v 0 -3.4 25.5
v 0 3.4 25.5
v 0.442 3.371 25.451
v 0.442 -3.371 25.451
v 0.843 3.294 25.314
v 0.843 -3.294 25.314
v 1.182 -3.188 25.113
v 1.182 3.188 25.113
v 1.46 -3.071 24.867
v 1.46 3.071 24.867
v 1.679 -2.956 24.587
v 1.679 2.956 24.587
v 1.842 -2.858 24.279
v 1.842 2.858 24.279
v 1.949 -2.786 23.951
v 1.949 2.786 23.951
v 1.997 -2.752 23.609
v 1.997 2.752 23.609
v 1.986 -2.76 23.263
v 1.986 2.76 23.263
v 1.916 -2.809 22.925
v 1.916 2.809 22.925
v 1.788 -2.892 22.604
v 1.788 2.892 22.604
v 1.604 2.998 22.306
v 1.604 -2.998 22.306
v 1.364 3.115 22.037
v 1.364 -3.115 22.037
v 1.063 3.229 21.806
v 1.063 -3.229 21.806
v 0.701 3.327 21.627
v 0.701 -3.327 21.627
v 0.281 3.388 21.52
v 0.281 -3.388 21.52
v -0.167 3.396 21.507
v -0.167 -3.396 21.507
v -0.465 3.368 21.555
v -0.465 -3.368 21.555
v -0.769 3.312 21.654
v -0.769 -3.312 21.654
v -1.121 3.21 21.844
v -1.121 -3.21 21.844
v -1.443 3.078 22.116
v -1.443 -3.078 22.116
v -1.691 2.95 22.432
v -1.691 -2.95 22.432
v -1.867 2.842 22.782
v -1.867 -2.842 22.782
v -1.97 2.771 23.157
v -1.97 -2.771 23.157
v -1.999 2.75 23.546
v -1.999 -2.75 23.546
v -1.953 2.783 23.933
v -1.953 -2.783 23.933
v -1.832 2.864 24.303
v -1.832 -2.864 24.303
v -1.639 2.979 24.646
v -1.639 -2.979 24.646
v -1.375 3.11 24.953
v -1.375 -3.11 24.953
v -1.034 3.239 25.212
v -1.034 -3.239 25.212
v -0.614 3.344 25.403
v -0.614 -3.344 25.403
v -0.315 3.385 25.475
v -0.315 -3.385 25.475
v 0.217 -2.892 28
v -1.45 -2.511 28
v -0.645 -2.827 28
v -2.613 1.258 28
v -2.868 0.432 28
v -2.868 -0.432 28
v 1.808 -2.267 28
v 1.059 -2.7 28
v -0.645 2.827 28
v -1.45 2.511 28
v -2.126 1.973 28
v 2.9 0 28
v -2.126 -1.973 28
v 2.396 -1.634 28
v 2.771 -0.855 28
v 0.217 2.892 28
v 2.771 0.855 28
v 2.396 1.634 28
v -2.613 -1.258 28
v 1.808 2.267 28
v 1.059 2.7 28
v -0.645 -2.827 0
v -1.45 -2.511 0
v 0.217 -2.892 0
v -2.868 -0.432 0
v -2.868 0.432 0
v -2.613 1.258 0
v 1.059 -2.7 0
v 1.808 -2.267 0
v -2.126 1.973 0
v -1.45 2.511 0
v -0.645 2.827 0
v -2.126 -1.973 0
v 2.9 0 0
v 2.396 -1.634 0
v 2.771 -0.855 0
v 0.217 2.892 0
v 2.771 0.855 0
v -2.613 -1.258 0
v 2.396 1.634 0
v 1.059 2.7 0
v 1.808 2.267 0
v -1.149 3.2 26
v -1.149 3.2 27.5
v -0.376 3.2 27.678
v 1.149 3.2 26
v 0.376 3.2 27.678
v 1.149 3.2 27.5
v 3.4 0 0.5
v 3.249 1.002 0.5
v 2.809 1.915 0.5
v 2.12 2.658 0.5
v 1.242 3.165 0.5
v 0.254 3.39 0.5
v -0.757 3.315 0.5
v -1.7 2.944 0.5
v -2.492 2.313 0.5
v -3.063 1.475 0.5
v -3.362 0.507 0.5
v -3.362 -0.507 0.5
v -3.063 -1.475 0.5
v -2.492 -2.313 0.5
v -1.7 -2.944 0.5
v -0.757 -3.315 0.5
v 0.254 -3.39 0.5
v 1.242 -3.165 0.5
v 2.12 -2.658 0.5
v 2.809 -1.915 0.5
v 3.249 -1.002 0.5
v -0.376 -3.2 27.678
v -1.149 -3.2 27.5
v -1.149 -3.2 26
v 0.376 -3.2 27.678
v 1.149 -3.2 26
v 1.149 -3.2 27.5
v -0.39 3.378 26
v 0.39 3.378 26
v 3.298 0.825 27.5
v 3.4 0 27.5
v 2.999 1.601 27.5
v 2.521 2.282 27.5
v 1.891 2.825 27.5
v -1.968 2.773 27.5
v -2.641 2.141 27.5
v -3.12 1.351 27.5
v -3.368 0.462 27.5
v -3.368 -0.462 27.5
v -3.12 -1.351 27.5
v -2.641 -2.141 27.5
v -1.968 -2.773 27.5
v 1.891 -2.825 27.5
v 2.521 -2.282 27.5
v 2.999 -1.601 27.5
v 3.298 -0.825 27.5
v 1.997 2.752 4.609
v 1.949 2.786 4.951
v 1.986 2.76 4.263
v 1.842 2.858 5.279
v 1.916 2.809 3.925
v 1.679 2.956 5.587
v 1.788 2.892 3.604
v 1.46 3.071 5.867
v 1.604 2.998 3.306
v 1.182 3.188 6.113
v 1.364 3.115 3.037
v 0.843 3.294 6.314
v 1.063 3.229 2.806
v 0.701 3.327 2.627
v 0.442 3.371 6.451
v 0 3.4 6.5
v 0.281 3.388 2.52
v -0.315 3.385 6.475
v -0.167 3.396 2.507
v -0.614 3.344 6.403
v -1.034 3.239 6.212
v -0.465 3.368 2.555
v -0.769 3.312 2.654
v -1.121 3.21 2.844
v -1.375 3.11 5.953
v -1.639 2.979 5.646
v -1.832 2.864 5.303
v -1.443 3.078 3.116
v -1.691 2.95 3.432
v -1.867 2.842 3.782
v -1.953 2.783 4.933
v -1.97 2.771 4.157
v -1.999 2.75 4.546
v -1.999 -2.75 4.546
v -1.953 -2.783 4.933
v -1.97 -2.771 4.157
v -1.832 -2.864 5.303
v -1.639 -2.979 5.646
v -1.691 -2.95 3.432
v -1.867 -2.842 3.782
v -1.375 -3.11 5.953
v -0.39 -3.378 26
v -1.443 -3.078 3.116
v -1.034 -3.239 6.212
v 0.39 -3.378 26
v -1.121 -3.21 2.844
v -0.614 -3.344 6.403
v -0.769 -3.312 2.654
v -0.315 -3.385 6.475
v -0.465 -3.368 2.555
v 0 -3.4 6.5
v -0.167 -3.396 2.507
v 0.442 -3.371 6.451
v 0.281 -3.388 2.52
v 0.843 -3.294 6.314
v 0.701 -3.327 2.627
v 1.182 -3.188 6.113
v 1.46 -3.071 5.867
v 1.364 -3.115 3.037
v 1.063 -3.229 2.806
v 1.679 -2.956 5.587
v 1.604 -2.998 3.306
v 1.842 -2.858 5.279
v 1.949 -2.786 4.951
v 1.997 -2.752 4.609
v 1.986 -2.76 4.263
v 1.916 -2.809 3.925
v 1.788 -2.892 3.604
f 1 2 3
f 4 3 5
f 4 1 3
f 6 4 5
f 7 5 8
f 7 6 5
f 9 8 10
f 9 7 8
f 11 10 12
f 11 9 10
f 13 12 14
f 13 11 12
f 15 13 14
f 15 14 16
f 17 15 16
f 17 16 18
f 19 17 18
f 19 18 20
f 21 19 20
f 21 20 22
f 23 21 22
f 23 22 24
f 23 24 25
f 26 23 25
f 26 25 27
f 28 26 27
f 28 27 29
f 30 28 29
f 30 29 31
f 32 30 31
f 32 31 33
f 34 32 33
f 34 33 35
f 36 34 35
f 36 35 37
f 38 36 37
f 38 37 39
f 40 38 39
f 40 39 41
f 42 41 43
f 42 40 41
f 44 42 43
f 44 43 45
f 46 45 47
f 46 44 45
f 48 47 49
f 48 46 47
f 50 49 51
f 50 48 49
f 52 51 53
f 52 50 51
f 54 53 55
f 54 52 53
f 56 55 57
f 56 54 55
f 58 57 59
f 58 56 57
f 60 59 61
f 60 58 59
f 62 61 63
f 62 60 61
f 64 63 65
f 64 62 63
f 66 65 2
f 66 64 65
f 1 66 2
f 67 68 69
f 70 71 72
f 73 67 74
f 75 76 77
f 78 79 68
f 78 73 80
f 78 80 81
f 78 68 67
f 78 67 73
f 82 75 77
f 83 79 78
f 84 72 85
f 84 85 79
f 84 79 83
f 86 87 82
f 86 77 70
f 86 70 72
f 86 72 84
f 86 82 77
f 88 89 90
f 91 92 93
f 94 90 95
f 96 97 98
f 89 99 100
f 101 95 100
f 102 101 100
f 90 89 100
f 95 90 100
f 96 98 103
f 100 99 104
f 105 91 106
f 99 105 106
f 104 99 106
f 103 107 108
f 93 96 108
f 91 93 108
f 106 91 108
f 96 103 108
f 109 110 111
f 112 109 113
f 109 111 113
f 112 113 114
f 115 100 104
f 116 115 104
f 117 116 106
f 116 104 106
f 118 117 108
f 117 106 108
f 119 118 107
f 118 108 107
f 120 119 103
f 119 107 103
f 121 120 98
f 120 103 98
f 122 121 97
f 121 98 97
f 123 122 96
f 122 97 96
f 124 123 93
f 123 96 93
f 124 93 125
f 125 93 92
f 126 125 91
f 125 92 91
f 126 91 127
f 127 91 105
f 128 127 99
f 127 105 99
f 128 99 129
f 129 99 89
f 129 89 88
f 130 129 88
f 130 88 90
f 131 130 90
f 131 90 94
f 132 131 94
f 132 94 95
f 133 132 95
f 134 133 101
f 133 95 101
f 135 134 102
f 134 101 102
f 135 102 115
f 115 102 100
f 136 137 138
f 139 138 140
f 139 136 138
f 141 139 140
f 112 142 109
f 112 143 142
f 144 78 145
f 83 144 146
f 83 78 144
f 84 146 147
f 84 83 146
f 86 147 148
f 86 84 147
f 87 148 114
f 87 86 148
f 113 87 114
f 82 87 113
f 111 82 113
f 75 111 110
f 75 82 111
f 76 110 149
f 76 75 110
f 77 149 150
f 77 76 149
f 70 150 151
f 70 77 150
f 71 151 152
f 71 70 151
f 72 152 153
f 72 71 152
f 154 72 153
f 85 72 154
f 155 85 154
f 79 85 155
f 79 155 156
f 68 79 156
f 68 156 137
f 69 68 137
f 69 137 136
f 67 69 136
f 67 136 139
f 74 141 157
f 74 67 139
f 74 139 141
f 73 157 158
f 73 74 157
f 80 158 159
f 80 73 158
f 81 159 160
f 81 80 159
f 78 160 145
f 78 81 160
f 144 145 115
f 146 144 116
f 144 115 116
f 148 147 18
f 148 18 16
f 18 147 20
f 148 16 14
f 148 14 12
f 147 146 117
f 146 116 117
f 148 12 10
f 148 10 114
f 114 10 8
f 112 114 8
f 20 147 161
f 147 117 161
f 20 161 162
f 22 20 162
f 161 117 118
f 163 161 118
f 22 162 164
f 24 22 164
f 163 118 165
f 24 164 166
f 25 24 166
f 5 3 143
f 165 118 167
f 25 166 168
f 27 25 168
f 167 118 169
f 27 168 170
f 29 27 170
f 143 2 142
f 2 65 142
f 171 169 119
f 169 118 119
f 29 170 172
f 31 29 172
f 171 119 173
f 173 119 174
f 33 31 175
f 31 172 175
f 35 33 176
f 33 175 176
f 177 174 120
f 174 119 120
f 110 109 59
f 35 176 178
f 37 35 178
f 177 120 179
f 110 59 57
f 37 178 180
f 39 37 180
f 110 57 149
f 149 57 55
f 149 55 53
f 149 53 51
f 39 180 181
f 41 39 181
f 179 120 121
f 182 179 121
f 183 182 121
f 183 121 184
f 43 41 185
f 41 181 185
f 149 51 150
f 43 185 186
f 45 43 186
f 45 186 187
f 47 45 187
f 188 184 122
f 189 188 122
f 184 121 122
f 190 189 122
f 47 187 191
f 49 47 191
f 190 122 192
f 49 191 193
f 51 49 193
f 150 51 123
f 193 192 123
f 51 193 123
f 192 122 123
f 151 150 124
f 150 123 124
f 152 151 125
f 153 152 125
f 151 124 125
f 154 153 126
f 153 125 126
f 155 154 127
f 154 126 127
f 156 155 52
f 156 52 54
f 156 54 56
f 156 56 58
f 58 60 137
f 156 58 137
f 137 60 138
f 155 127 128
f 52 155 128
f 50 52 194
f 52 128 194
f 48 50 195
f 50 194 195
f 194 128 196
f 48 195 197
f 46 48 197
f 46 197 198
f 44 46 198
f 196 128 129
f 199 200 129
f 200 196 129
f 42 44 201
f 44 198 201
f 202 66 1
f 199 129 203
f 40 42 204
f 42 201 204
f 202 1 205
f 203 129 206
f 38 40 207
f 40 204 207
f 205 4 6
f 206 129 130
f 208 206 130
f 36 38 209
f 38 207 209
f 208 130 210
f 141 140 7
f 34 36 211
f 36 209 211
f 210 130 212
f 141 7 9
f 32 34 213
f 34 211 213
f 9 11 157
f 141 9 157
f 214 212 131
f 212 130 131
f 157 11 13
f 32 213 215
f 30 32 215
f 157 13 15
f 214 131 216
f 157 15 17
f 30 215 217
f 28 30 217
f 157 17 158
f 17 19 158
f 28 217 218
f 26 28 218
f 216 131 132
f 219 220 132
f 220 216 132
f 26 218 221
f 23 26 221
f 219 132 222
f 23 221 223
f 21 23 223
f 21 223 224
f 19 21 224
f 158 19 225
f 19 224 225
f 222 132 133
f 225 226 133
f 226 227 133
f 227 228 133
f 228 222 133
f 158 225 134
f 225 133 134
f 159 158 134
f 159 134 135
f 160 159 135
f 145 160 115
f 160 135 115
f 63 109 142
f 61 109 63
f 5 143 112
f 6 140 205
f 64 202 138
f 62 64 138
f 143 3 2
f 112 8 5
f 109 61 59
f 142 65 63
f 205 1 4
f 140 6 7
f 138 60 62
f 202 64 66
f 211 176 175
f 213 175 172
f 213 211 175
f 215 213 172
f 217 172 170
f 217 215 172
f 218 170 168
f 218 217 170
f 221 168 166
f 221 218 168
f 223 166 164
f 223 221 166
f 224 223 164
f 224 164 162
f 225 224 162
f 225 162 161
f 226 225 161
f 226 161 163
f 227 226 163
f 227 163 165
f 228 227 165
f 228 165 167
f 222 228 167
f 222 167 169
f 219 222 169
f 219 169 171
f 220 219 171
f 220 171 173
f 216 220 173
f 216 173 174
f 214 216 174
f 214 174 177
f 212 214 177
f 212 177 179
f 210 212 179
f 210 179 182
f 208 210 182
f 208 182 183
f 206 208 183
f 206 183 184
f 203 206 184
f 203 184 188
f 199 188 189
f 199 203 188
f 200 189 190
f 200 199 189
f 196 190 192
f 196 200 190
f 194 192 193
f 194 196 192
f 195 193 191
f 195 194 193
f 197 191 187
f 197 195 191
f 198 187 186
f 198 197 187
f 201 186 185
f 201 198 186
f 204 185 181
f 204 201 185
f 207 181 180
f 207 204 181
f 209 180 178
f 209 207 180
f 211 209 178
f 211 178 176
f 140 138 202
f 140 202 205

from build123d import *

# Parameters (mm, degrees)
ESQUISSE1_R                  = 3.4
BOSS_EXTRU_1_DEPTH           = 28
ENL_V_MAT_EXTRU_1_DEPTH      = 29.409857444
ENL_V_MAT_EXTRU_1_DEPTH_BACK = 29.409857444
ESQUISSE2_R                  = 2
CHANFREIN1_SIZE              = 0.5
ESQUISSE3_W                  = 6.25957
ESQUISSE3_H                  = 2.330719663
ENL_V_MAT_EXTRU_2_DEPTH      = 2


with BuildPart() as part:
    # Esquisse1 → Boss.-Extru.1 (new body)
    with BuildSketch(Plane.XY):
        Circle(ESQUISSE1_R)
    extrude(amount=BOSS_EXTRU_1_DEPTH)

    # Esquisse2 → Enlèv. mat.-Extru.1 (cut, two sides: drawn at the far end of the back side and taken through both)
    with BuildSketch(Plane(origin=(0, 0, 0), x_dir=(1, 0, 0), z_dir=(0, 1, 0)).offset(-ENL_V_MAT_EXTRU_1_DEPTH_BACK)):
        with Locations(Location((0, -4.5, 0), (0, 0, 270))):
            Circle(ESQUISSE2_R)
        with Locations(Location((0, -23.5, 0), (0, 0, 270))):
            Circle(ESQUISSE2_R)
    extrude(amount=ENL_V_MAT_EXTRU_1_DEPTH + ENL_V_MAT_EXTRU_1_DEPTH_BACK, mode=Mode.SUBTRACT)

    # Chanfrein1
    chanfrein1_edges = [part.edges().sort_by_distance(p)[0] for p in [
        (-3.4, 0, 0),
        (-3.4, 0, 28),
    ]]
    chamfer(chanfrein1_edges, length=CHANFREIN1_SIZE)

    # Esquisse3 → Enlèv. mat.-Extru.2 (cut)
    with BuildSketch(Plane.XY.offset(28)):
        with Locations((0, 4.365359832)):
            Rectangle(ESQUISSE3_W, ESQUISSE3_H)
        with Locations((0, -4.365359832)):
            Rectangle(ESQUISSE3_W, ESQUISSE3_H)
    extrude(amount=-ENL_V_MAT_EXTRU_2_DEPTH, mode=Mode.SUBTRACT)


solid = part.part
